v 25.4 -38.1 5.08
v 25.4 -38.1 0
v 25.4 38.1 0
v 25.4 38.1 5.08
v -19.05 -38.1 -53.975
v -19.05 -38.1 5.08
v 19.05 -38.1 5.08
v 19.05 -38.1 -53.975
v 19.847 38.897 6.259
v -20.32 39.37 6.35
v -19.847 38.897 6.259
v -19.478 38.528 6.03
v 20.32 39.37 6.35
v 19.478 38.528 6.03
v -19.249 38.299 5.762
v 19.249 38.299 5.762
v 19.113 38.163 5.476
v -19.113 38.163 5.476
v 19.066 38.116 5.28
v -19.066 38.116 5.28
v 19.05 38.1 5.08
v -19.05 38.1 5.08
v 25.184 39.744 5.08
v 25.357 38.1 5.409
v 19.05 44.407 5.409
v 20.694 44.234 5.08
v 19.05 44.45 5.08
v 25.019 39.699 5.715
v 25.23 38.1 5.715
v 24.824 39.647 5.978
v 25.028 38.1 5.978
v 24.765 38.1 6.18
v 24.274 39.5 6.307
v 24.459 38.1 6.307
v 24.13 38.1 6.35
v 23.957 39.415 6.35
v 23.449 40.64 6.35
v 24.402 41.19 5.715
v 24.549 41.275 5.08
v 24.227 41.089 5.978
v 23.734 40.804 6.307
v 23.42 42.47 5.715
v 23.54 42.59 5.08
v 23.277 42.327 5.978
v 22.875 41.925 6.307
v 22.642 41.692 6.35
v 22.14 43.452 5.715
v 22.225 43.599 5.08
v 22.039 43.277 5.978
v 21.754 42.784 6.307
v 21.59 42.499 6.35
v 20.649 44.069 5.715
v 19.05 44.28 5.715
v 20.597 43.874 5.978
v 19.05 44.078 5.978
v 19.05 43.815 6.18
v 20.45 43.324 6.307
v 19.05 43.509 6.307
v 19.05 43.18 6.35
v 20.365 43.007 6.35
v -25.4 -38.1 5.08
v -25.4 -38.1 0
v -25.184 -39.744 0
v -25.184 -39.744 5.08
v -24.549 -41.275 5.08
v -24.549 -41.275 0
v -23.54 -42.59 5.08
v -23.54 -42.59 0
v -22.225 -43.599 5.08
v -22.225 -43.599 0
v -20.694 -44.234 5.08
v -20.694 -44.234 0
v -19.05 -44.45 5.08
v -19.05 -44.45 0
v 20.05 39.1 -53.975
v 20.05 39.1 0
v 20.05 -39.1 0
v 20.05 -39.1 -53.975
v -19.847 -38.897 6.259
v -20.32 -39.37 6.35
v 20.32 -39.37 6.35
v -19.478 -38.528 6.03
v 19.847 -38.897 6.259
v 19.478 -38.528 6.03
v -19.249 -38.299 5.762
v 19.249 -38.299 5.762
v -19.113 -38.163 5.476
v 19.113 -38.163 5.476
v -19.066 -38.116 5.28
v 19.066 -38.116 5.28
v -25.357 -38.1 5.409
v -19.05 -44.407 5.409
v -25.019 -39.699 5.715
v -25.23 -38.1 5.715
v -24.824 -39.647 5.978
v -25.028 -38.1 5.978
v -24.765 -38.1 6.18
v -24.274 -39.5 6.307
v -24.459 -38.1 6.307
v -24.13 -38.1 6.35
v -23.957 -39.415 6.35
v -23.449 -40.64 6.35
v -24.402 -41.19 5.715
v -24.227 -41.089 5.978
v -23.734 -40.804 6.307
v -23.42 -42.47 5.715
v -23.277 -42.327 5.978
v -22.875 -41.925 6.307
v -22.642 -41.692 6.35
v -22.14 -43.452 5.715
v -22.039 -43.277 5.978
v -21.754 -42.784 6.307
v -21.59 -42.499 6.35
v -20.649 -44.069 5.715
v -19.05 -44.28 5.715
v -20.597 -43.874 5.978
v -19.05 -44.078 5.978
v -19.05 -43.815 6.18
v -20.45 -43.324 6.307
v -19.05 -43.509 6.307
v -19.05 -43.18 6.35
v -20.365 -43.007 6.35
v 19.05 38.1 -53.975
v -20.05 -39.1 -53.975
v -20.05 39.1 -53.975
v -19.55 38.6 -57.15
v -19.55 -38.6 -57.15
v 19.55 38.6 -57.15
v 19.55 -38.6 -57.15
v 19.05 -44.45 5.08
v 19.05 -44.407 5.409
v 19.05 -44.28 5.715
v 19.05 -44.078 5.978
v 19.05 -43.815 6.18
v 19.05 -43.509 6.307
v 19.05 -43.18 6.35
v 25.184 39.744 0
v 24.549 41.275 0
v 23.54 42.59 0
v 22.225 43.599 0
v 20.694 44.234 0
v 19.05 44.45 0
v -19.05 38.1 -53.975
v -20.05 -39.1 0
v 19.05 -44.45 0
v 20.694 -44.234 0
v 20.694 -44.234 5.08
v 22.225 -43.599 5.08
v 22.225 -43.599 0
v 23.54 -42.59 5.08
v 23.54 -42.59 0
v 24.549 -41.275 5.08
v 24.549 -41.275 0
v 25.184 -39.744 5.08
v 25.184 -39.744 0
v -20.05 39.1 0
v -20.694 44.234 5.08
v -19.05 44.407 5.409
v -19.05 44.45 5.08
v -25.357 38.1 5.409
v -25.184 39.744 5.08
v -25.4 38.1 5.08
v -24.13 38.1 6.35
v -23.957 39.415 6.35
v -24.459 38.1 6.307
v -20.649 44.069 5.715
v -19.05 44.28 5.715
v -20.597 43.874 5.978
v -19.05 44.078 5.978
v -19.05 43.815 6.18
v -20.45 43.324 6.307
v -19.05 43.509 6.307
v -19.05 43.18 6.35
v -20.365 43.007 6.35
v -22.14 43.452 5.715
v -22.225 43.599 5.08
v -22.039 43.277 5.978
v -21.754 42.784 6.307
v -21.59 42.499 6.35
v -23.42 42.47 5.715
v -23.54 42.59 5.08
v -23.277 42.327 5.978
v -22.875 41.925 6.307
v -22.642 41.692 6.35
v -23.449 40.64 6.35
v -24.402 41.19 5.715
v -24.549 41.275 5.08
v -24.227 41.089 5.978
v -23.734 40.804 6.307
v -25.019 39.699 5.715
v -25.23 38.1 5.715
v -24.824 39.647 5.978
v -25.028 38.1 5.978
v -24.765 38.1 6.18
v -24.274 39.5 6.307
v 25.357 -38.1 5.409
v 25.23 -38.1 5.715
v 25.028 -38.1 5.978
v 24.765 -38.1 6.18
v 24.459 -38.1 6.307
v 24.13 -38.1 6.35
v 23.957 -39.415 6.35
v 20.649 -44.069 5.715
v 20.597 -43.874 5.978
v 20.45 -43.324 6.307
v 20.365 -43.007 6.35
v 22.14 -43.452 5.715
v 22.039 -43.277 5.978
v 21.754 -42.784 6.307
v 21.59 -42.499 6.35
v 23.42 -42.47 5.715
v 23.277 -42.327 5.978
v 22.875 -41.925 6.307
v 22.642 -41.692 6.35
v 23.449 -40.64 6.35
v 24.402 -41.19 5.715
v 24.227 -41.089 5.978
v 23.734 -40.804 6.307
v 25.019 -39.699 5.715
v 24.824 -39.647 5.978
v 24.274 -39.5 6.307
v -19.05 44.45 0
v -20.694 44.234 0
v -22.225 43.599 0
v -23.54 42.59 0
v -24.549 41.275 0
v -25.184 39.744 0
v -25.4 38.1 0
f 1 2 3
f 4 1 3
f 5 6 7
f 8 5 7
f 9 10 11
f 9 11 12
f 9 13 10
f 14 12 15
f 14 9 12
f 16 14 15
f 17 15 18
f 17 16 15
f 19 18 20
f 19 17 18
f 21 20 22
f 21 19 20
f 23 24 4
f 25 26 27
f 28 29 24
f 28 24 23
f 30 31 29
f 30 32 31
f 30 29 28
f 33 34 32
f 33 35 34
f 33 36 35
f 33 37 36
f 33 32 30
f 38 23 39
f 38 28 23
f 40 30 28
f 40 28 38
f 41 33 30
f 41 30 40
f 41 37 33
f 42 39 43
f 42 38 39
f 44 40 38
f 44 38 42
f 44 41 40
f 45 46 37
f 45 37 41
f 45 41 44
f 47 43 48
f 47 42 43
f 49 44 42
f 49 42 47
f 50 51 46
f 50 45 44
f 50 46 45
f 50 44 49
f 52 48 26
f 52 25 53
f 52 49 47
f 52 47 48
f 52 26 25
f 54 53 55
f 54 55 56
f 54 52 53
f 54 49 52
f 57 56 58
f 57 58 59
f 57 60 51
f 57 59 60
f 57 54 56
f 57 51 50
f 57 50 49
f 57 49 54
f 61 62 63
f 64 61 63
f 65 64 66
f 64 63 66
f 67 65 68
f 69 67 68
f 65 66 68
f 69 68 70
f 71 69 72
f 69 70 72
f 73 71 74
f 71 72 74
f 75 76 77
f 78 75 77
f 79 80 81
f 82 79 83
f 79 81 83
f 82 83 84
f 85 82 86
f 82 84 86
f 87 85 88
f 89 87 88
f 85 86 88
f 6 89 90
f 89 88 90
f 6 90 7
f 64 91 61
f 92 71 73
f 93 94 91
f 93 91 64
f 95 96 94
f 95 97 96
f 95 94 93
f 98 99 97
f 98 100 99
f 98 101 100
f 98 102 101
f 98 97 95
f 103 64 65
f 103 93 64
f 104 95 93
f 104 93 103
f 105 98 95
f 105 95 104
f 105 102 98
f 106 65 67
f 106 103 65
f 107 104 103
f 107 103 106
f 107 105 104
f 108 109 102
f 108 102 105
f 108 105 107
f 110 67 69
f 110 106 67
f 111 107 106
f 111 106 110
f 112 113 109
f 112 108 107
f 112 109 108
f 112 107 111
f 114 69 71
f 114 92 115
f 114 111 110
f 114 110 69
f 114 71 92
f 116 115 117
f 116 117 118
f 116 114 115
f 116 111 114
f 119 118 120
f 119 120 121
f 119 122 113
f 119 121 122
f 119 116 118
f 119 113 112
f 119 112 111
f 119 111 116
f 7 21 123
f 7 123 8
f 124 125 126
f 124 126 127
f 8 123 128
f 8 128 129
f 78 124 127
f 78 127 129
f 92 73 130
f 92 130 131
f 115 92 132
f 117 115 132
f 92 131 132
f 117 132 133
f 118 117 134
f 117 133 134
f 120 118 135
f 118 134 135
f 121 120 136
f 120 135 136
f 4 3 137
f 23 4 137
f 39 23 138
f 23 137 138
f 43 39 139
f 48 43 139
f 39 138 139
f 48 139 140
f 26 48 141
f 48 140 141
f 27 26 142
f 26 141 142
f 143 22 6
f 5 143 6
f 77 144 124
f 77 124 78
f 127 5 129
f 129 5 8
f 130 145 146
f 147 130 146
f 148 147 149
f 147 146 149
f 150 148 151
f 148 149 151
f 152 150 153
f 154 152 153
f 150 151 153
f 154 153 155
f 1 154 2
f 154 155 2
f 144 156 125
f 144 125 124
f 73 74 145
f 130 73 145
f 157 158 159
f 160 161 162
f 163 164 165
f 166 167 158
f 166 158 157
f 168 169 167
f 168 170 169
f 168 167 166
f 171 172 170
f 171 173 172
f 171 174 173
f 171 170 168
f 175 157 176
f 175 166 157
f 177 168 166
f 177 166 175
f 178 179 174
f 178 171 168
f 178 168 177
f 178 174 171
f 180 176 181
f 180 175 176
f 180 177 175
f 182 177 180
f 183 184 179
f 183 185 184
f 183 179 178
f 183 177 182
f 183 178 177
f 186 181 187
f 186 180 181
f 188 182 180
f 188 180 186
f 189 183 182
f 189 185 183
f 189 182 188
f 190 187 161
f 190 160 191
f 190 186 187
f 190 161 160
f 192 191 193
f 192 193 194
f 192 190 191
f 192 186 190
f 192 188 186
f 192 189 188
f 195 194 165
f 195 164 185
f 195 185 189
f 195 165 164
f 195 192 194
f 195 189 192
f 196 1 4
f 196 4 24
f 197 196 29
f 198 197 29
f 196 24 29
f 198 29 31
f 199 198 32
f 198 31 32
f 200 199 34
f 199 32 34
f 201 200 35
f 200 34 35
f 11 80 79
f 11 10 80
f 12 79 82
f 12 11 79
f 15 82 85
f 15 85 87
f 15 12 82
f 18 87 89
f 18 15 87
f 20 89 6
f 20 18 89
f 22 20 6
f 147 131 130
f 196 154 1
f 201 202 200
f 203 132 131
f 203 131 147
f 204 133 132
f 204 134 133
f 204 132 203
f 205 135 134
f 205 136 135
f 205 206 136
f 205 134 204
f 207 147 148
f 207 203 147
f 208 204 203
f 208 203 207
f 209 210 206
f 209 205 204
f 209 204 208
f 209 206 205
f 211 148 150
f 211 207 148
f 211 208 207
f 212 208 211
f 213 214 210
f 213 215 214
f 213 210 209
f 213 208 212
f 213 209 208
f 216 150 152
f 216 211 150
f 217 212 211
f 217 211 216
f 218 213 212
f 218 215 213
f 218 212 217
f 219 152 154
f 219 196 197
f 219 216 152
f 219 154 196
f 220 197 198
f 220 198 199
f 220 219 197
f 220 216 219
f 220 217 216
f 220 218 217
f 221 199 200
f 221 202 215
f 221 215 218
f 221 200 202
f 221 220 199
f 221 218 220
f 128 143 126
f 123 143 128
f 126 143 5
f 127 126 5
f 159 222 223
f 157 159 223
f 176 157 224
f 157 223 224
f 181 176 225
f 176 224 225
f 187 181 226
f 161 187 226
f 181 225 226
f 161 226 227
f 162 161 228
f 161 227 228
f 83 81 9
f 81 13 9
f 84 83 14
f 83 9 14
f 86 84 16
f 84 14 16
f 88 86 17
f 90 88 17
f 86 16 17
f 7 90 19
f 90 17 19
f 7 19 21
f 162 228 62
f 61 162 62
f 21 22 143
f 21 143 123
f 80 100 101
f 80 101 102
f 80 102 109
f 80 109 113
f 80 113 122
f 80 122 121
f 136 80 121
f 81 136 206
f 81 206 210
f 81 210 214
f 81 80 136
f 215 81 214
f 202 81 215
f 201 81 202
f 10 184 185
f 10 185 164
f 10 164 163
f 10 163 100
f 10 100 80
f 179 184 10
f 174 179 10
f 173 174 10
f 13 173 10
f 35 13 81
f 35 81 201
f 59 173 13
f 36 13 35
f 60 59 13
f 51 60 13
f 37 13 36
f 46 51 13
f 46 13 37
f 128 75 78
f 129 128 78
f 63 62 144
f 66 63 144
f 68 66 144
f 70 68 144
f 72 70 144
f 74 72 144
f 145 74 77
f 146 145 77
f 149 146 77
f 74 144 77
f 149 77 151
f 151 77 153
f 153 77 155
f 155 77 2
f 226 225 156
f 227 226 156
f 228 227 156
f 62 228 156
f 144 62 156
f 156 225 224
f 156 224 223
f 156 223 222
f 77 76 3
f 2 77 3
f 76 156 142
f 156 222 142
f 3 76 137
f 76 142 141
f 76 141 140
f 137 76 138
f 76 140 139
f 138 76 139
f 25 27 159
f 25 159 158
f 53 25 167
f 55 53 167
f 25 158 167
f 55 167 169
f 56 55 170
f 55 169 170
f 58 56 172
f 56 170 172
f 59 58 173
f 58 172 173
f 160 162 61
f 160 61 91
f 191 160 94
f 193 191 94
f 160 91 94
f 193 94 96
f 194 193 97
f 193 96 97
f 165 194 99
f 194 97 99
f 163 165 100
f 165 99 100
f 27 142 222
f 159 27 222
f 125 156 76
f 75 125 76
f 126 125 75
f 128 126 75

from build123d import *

# Parameters (mm, degrees)
F0_W     = 40.1
F0_H     = 78.2
F0_W_2   = 38.1
F0_H_2   = 76.2
F1_DEPTH = 6.35
F2_W     = 40.1
F2_H     = 78.2
F2_W_2   = 38.1
F2_H_2   = 76.2
F3_DEPTH = 57.15
F4_SIZE2 = 3.17499
F4_SIZE  = 0.49999
F5_R     = 1.27


# Not quite as in the source:
# - a fillet or chamfer is up to 0.001 mm smaller than in the source, because OpenCascade refuses the exact size


with BuildPart() as f1:
    # F0 (on Top) → F1 (new body)
    with BuildSketch(Plane.XY):
        with BuildLine():
            ThreePointArc((25.4, 38.1), (23.5401280605, 42.5901280605), (19.05, 44.45))
            Line((19.05, 44.45), (-19.05, 44.45))
            ThreePointArc((-19.05, 44.45), (-23.5401280605, 42.5901280605), (-25.4, 38.1))
            Line((-25.4, 38.1), (-25.4, -38.1))
            ThreePointArc((-25.4, -38.1), (-23.5401280605, -42.5901280605), (-19.05, -44.45))
            Line((-19.05, -44.45), (19.05, -44.45))
            ThreePointArc((19.05, -44.45), (23.5401280605, -42.5901280605), (25.4, -38.1))
            Line((25.4, -38.1), (25.4, 38.1))
        make_face()
        Rectangle(F0_W, F0_H, mode=Mode.SUBTRACT)
        Rectangle(F0_W, F0_H)
        Rectangle(F0_W_2, F0_H_2, mode=Mode.SUBTRACT)
    extrude(amount=F1_DEPTH)

    # F2 (on face) → F3 (join)
    with BuildSketch(Plane(origin=(0, 0, 0), x_dir=(1, 0, 0), z_dir=(0, 0, -1))):
        Rectangle(F2_W, F2_H)
        Rectangle(F2_W_2, F2_H_2, mode=Mode.SUBTRACT)
    extrude(amount=F3_DEPTH)

    # F4 (size 0.5 and 3.175 in the source; OpenCascade refuses exactly that, so slightly less here)
    f4_edges = [f1.edges().sort_by_distance(p)[0] for p in [
        (-20.05, 0, -57.15),
        (0, 39.1, -57.15),
        (20.05, 0, -57.15),
        (0, -39.1, -57.15),
        (0, -38.1, -57.15),
        (19.05, 0, -57.15),
        (0, 38.1, -57.15),
        (-19.05, 0, -57.15),
    ]]
    f4_side = f1.faces().sort_by_distance((-19.17118, 0, -57.15))[0]
    chamfer(f4_edges, length=F4_SIZE, length2=F4_SIZE2, reference=f4_side)

    # F5
    f5_edges = [f1.edges().sort_by_distance(p)[0] for p in [
        (23.540128, 42.590128, 6.35),
        (0, 44.45, 6.35),
        (-23.540128, 42.590128, 6.35),
        (-25.4, 0, 6.35),
        (-23.540128, -42.590128, 6.35),
        (0, -44.45, 6.35),
        (23.540128, -42.590128, 6.35),
        (25.4, 0, 6.35),
        (0, -38.1, 6.35),
        (-19.05, 0, 6.35),
        (0, 38.1, 6.35),
        (19.05, 0, 6.35),
    ]]
    fillet(f5_edges, radius=F5_R)


solid = f1.part
